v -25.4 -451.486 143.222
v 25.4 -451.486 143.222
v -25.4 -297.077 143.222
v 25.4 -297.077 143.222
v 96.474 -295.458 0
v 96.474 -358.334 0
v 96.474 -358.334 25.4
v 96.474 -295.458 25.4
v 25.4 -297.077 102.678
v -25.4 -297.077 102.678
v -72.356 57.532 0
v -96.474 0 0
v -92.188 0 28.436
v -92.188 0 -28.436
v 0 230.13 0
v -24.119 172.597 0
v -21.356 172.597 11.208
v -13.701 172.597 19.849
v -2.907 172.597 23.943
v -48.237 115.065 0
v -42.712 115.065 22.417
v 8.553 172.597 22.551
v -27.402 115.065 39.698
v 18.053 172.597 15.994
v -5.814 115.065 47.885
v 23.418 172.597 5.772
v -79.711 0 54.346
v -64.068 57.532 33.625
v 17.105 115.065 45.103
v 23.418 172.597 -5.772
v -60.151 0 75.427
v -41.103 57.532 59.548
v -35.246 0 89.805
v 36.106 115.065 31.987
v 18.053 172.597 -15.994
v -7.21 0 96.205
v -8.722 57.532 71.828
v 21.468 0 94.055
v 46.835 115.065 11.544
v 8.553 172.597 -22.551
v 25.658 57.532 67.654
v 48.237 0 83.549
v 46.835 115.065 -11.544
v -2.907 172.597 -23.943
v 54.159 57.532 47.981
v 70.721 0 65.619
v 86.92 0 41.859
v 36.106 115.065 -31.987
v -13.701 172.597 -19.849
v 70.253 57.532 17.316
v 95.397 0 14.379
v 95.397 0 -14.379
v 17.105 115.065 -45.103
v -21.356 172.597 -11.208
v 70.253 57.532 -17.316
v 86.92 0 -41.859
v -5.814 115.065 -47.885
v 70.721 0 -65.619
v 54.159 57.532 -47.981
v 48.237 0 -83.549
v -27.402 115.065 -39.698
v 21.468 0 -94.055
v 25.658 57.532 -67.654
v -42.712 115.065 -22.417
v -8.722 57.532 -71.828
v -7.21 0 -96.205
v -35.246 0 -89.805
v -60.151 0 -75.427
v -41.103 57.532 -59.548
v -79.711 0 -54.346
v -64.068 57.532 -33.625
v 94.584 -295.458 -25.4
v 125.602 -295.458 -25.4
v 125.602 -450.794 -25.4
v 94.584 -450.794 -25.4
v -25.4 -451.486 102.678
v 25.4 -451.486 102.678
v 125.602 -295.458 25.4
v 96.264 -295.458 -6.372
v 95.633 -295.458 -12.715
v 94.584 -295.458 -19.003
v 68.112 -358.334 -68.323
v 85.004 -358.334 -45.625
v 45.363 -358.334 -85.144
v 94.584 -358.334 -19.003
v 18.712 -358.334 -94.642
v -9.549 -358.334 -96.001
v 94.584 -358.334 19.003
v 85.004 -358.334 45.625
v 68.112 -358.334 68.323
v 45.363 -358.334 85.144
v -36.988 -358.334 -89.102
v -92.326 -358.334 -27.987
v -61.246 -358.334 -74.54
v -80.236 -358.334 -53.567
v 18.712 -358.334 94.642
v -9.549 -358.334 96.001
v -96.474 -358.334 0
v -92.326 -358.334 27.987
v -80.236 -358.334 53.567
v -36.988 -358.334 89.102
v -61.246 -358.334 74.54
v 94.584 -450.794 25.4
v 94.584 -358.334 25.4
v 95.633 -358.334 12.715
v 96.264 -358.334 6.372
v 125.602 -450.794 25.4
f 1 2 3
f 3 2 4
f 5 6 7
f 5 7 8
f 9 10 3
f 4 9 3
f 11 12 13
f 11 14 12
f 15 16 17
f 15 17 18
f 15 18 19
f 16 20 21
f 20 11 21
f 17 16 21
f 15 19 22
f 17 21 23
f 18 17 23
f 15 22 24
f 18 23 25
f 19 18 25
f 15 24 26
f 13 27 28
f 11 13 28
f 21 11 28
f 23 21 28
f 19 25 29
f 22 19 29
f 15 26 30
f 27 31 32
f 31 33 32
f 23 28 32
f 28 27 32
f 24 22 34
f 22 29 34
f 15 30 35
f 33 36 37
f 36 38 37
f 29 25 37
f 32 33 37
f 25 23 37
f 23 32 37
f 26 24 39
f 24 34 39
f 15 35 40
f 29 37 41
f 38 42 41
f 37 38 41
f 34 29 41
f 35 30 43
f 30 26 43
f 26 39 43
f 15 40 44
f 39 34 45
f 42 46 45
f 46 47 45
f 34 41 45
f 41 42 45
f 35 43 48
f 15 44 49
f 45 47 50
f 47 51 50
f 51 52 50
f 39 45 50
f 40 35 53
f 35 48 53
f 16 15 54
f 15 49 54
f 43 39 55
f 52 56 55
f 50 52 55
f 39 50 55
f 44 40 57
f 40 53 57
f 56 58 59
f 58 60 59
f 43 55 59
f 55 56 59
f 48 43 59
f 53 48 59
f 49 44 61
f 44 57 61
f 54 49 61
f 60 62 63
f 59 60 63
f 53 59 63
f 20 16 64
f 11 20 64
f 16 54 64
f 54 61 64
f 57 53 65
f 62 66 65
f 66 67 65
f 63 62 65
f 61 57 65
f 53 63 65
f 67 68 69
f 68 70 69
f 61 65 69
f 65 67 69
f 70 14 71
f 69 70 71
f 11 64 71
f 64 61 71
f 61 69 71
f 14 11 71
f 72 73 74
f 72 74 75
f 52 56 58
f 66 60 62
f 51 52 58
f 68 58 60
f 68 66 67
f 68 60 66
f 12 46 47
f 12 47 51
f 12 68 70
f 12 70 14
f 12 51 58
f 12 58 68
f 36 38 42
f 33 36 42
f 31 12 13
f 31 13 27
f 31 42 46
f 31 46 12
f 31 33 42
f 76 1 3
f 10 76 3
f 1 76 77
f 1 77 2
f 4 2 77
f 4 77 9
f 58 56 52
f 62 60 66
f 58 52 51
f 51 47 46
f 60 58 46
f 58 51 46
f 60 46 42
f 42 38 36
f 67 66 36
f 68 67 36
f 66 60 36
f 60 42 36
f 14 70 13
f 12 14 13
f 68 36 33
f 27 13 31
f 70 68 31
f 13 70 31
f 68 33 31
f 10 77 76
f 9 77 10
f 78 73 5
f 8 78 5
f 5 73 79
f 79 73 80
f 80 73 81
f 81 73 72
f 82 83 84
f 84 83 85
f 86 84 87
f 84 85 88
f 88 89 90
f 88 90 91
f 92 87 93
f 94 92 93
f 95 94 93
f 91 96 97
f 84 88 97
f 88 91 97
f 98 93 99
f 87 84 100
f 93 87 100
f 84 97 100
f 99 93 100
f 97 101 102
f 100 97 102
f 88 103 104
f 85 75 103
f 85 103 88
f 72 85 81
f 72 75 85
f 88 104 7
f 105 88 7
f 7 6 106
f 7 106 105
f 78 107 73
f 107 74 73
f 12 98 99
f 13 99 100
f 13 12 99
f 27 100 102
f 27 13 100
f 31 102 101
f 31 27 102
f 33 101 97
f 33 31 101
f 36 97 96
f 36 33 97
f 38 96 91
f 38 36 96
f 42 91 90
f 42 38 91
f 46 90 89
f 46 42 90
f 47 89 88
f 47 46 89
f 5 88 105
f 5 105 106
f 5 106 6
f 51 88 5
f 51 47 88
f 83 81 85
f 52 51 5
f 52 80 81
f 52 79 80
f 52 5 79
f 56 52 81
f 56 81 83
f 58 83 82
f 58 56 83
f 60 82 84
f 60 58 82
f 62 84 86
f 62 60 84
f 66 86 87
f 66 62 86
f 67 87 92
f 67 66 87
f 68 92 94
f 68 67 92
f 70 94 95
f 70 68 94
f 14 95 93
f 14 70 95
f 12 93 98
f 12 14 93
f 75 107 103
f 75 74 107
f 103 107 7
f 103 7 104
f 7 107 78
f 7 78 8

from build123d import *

# Parameters (mm, degrees)
F4_DEPTH  = 356.7984104156
F0_R      = 96.474269749
F5_DEPTH  = 358.334004879
F7_W      = 31.0177132487
F7_H      = 155.3362011909
F9_DEPTH  = 25.4
F10_DEPTH = 25.4
F8_W      = 155.1911532879
F8_H      = 39.4811406732
F11_DEPTH = 25.4
F12_DEPTH = 25.4
F7_W_2    = 35.9391272068
F7_H_2    = 158.800393343
F13_DEPTH = 25.4
F14_DEPTH = 25.4
F15_DEPTH = 25.4
F8_W_2    = 154.4083654881
F8_H_2    = 40.5437201262
F16_DEPTH = 25.4
F17_DEPTH = 25.4
F5_FACE_R = 96.474269749


with BuildPart() as f4:
    # F3 (on face) → F4 (new body)
    with BuildSketch(Plane.XZ):
        with BuildLine():
            ThreePointArc((96.474269749, 0), (0, 96.474269749), (-96.474269749, 0))
            Line((-96.474269749, 0), (0, 0))
            Line((0, 0), (96.474269749, 0))
        make_face()
    extrude(amount=F4_DEPTH)

    # F0 (on Front) → F5 (join)
    with BuildSketch(Plane.XZ):
        Circle(F0_R)
    extrude(amount=F5_DEPTH)

    # F7 (on Top) → F9 (join)
    with BuildSketch(Plane.XY):
        with Locations((-110.0929714739, -373.1260895729)):
            Rectangle(F7_W, F7_H)
    extrude(amount=-F9_DEPTH)

    # F10 (add): a face of the model
    f10_faces = [f4.faces().sort_by_distance(p)[0] for p in [
        (-110.4612875771, -374.2952426729, 0),
    ]]
    extrude(f10_faces, amount=F10_DEPTH)


with BuildPart() as f11:
    # F8 (on Right) → F11 (new body)
    with BuildSketch(Plane.YZ):
        with Locations((-374.6730536222, -119.7640411556)):
            Rectangle(F8_W, F8_H)
    extrude(amount=-F11_DEPTH)

    # F12 (add): a face of the model
    f12_faces = [f11.faces().sort_by_distance(p)[0] for p in [
        (0, -374.6730536222, -119.7640411556),
    ]]
    extrude(f12_faces, amount=F12_DEPTH)


with BuildPart() as f13:
    # F7 (on Top) → F13 (new body)
    with BuildSketch(Plane.XY):
        with Locations((116.1221414804, -374.288007617)):
            Rectangle(F7_W_2, F7_H_2)
    extrude(amount=F13_DEPTH)

    # F7 (on Top) → F14 (join)
    with BuildSketch(Plane.XY):
        with Locations((116.1221414804, -374.288007617)):
            Rectangle(F7_W_2, F7_H_2)
    extrude(amount=F14_DEPTH)

    # F7 (on Top) → F15 (join)
    with BuildSketch(Plane.XY):
        with Locations((116.1221414804, -374.288007617)):
            Rectangle(F7_W_2, F7_H_2)
    extrude(amount=-F15_DEPTH)


with BuildPart() as f16:
    # F8 (on Right) → F16 (new body)
    with BuildSketch(Plane.YZ):
        with Locations((-374.2816597223, 122.9500994086)):
            Rectangle(F8_W_2, F8_H_2)
    extrude(amount=F16_DEPTH)

    # F8 (on Right) → F17 (join)
    with BuildSketch(Plane.YZ):
        with Locations((-374.2816597223, 122.9500994086)):
            Rectangle(F8_W_2, F8_H_2)
    extrude(amount=-F17_DEPTH)


with BuildPart() as f19:
    # F5_face (on face) → F19 section 0
    with BuildSketch(Plane(origin=(0, 0, 0), x_dir=(-1, 0, 0), z_dir=(0, 1, 0)), mode=Mode.PRIVATE) as f19_s0:
        Circle(F5_FACE_R)
    loft([Vertex(0, 230.1296591759, 0), f19_s0.sketch])


with BuildPart() as f20_1:
    # F20: instance of F4
    add(f4.part.mirror(Plane.YZ))


solid = Compound([f16.part, f19.part, f20_1.part])
